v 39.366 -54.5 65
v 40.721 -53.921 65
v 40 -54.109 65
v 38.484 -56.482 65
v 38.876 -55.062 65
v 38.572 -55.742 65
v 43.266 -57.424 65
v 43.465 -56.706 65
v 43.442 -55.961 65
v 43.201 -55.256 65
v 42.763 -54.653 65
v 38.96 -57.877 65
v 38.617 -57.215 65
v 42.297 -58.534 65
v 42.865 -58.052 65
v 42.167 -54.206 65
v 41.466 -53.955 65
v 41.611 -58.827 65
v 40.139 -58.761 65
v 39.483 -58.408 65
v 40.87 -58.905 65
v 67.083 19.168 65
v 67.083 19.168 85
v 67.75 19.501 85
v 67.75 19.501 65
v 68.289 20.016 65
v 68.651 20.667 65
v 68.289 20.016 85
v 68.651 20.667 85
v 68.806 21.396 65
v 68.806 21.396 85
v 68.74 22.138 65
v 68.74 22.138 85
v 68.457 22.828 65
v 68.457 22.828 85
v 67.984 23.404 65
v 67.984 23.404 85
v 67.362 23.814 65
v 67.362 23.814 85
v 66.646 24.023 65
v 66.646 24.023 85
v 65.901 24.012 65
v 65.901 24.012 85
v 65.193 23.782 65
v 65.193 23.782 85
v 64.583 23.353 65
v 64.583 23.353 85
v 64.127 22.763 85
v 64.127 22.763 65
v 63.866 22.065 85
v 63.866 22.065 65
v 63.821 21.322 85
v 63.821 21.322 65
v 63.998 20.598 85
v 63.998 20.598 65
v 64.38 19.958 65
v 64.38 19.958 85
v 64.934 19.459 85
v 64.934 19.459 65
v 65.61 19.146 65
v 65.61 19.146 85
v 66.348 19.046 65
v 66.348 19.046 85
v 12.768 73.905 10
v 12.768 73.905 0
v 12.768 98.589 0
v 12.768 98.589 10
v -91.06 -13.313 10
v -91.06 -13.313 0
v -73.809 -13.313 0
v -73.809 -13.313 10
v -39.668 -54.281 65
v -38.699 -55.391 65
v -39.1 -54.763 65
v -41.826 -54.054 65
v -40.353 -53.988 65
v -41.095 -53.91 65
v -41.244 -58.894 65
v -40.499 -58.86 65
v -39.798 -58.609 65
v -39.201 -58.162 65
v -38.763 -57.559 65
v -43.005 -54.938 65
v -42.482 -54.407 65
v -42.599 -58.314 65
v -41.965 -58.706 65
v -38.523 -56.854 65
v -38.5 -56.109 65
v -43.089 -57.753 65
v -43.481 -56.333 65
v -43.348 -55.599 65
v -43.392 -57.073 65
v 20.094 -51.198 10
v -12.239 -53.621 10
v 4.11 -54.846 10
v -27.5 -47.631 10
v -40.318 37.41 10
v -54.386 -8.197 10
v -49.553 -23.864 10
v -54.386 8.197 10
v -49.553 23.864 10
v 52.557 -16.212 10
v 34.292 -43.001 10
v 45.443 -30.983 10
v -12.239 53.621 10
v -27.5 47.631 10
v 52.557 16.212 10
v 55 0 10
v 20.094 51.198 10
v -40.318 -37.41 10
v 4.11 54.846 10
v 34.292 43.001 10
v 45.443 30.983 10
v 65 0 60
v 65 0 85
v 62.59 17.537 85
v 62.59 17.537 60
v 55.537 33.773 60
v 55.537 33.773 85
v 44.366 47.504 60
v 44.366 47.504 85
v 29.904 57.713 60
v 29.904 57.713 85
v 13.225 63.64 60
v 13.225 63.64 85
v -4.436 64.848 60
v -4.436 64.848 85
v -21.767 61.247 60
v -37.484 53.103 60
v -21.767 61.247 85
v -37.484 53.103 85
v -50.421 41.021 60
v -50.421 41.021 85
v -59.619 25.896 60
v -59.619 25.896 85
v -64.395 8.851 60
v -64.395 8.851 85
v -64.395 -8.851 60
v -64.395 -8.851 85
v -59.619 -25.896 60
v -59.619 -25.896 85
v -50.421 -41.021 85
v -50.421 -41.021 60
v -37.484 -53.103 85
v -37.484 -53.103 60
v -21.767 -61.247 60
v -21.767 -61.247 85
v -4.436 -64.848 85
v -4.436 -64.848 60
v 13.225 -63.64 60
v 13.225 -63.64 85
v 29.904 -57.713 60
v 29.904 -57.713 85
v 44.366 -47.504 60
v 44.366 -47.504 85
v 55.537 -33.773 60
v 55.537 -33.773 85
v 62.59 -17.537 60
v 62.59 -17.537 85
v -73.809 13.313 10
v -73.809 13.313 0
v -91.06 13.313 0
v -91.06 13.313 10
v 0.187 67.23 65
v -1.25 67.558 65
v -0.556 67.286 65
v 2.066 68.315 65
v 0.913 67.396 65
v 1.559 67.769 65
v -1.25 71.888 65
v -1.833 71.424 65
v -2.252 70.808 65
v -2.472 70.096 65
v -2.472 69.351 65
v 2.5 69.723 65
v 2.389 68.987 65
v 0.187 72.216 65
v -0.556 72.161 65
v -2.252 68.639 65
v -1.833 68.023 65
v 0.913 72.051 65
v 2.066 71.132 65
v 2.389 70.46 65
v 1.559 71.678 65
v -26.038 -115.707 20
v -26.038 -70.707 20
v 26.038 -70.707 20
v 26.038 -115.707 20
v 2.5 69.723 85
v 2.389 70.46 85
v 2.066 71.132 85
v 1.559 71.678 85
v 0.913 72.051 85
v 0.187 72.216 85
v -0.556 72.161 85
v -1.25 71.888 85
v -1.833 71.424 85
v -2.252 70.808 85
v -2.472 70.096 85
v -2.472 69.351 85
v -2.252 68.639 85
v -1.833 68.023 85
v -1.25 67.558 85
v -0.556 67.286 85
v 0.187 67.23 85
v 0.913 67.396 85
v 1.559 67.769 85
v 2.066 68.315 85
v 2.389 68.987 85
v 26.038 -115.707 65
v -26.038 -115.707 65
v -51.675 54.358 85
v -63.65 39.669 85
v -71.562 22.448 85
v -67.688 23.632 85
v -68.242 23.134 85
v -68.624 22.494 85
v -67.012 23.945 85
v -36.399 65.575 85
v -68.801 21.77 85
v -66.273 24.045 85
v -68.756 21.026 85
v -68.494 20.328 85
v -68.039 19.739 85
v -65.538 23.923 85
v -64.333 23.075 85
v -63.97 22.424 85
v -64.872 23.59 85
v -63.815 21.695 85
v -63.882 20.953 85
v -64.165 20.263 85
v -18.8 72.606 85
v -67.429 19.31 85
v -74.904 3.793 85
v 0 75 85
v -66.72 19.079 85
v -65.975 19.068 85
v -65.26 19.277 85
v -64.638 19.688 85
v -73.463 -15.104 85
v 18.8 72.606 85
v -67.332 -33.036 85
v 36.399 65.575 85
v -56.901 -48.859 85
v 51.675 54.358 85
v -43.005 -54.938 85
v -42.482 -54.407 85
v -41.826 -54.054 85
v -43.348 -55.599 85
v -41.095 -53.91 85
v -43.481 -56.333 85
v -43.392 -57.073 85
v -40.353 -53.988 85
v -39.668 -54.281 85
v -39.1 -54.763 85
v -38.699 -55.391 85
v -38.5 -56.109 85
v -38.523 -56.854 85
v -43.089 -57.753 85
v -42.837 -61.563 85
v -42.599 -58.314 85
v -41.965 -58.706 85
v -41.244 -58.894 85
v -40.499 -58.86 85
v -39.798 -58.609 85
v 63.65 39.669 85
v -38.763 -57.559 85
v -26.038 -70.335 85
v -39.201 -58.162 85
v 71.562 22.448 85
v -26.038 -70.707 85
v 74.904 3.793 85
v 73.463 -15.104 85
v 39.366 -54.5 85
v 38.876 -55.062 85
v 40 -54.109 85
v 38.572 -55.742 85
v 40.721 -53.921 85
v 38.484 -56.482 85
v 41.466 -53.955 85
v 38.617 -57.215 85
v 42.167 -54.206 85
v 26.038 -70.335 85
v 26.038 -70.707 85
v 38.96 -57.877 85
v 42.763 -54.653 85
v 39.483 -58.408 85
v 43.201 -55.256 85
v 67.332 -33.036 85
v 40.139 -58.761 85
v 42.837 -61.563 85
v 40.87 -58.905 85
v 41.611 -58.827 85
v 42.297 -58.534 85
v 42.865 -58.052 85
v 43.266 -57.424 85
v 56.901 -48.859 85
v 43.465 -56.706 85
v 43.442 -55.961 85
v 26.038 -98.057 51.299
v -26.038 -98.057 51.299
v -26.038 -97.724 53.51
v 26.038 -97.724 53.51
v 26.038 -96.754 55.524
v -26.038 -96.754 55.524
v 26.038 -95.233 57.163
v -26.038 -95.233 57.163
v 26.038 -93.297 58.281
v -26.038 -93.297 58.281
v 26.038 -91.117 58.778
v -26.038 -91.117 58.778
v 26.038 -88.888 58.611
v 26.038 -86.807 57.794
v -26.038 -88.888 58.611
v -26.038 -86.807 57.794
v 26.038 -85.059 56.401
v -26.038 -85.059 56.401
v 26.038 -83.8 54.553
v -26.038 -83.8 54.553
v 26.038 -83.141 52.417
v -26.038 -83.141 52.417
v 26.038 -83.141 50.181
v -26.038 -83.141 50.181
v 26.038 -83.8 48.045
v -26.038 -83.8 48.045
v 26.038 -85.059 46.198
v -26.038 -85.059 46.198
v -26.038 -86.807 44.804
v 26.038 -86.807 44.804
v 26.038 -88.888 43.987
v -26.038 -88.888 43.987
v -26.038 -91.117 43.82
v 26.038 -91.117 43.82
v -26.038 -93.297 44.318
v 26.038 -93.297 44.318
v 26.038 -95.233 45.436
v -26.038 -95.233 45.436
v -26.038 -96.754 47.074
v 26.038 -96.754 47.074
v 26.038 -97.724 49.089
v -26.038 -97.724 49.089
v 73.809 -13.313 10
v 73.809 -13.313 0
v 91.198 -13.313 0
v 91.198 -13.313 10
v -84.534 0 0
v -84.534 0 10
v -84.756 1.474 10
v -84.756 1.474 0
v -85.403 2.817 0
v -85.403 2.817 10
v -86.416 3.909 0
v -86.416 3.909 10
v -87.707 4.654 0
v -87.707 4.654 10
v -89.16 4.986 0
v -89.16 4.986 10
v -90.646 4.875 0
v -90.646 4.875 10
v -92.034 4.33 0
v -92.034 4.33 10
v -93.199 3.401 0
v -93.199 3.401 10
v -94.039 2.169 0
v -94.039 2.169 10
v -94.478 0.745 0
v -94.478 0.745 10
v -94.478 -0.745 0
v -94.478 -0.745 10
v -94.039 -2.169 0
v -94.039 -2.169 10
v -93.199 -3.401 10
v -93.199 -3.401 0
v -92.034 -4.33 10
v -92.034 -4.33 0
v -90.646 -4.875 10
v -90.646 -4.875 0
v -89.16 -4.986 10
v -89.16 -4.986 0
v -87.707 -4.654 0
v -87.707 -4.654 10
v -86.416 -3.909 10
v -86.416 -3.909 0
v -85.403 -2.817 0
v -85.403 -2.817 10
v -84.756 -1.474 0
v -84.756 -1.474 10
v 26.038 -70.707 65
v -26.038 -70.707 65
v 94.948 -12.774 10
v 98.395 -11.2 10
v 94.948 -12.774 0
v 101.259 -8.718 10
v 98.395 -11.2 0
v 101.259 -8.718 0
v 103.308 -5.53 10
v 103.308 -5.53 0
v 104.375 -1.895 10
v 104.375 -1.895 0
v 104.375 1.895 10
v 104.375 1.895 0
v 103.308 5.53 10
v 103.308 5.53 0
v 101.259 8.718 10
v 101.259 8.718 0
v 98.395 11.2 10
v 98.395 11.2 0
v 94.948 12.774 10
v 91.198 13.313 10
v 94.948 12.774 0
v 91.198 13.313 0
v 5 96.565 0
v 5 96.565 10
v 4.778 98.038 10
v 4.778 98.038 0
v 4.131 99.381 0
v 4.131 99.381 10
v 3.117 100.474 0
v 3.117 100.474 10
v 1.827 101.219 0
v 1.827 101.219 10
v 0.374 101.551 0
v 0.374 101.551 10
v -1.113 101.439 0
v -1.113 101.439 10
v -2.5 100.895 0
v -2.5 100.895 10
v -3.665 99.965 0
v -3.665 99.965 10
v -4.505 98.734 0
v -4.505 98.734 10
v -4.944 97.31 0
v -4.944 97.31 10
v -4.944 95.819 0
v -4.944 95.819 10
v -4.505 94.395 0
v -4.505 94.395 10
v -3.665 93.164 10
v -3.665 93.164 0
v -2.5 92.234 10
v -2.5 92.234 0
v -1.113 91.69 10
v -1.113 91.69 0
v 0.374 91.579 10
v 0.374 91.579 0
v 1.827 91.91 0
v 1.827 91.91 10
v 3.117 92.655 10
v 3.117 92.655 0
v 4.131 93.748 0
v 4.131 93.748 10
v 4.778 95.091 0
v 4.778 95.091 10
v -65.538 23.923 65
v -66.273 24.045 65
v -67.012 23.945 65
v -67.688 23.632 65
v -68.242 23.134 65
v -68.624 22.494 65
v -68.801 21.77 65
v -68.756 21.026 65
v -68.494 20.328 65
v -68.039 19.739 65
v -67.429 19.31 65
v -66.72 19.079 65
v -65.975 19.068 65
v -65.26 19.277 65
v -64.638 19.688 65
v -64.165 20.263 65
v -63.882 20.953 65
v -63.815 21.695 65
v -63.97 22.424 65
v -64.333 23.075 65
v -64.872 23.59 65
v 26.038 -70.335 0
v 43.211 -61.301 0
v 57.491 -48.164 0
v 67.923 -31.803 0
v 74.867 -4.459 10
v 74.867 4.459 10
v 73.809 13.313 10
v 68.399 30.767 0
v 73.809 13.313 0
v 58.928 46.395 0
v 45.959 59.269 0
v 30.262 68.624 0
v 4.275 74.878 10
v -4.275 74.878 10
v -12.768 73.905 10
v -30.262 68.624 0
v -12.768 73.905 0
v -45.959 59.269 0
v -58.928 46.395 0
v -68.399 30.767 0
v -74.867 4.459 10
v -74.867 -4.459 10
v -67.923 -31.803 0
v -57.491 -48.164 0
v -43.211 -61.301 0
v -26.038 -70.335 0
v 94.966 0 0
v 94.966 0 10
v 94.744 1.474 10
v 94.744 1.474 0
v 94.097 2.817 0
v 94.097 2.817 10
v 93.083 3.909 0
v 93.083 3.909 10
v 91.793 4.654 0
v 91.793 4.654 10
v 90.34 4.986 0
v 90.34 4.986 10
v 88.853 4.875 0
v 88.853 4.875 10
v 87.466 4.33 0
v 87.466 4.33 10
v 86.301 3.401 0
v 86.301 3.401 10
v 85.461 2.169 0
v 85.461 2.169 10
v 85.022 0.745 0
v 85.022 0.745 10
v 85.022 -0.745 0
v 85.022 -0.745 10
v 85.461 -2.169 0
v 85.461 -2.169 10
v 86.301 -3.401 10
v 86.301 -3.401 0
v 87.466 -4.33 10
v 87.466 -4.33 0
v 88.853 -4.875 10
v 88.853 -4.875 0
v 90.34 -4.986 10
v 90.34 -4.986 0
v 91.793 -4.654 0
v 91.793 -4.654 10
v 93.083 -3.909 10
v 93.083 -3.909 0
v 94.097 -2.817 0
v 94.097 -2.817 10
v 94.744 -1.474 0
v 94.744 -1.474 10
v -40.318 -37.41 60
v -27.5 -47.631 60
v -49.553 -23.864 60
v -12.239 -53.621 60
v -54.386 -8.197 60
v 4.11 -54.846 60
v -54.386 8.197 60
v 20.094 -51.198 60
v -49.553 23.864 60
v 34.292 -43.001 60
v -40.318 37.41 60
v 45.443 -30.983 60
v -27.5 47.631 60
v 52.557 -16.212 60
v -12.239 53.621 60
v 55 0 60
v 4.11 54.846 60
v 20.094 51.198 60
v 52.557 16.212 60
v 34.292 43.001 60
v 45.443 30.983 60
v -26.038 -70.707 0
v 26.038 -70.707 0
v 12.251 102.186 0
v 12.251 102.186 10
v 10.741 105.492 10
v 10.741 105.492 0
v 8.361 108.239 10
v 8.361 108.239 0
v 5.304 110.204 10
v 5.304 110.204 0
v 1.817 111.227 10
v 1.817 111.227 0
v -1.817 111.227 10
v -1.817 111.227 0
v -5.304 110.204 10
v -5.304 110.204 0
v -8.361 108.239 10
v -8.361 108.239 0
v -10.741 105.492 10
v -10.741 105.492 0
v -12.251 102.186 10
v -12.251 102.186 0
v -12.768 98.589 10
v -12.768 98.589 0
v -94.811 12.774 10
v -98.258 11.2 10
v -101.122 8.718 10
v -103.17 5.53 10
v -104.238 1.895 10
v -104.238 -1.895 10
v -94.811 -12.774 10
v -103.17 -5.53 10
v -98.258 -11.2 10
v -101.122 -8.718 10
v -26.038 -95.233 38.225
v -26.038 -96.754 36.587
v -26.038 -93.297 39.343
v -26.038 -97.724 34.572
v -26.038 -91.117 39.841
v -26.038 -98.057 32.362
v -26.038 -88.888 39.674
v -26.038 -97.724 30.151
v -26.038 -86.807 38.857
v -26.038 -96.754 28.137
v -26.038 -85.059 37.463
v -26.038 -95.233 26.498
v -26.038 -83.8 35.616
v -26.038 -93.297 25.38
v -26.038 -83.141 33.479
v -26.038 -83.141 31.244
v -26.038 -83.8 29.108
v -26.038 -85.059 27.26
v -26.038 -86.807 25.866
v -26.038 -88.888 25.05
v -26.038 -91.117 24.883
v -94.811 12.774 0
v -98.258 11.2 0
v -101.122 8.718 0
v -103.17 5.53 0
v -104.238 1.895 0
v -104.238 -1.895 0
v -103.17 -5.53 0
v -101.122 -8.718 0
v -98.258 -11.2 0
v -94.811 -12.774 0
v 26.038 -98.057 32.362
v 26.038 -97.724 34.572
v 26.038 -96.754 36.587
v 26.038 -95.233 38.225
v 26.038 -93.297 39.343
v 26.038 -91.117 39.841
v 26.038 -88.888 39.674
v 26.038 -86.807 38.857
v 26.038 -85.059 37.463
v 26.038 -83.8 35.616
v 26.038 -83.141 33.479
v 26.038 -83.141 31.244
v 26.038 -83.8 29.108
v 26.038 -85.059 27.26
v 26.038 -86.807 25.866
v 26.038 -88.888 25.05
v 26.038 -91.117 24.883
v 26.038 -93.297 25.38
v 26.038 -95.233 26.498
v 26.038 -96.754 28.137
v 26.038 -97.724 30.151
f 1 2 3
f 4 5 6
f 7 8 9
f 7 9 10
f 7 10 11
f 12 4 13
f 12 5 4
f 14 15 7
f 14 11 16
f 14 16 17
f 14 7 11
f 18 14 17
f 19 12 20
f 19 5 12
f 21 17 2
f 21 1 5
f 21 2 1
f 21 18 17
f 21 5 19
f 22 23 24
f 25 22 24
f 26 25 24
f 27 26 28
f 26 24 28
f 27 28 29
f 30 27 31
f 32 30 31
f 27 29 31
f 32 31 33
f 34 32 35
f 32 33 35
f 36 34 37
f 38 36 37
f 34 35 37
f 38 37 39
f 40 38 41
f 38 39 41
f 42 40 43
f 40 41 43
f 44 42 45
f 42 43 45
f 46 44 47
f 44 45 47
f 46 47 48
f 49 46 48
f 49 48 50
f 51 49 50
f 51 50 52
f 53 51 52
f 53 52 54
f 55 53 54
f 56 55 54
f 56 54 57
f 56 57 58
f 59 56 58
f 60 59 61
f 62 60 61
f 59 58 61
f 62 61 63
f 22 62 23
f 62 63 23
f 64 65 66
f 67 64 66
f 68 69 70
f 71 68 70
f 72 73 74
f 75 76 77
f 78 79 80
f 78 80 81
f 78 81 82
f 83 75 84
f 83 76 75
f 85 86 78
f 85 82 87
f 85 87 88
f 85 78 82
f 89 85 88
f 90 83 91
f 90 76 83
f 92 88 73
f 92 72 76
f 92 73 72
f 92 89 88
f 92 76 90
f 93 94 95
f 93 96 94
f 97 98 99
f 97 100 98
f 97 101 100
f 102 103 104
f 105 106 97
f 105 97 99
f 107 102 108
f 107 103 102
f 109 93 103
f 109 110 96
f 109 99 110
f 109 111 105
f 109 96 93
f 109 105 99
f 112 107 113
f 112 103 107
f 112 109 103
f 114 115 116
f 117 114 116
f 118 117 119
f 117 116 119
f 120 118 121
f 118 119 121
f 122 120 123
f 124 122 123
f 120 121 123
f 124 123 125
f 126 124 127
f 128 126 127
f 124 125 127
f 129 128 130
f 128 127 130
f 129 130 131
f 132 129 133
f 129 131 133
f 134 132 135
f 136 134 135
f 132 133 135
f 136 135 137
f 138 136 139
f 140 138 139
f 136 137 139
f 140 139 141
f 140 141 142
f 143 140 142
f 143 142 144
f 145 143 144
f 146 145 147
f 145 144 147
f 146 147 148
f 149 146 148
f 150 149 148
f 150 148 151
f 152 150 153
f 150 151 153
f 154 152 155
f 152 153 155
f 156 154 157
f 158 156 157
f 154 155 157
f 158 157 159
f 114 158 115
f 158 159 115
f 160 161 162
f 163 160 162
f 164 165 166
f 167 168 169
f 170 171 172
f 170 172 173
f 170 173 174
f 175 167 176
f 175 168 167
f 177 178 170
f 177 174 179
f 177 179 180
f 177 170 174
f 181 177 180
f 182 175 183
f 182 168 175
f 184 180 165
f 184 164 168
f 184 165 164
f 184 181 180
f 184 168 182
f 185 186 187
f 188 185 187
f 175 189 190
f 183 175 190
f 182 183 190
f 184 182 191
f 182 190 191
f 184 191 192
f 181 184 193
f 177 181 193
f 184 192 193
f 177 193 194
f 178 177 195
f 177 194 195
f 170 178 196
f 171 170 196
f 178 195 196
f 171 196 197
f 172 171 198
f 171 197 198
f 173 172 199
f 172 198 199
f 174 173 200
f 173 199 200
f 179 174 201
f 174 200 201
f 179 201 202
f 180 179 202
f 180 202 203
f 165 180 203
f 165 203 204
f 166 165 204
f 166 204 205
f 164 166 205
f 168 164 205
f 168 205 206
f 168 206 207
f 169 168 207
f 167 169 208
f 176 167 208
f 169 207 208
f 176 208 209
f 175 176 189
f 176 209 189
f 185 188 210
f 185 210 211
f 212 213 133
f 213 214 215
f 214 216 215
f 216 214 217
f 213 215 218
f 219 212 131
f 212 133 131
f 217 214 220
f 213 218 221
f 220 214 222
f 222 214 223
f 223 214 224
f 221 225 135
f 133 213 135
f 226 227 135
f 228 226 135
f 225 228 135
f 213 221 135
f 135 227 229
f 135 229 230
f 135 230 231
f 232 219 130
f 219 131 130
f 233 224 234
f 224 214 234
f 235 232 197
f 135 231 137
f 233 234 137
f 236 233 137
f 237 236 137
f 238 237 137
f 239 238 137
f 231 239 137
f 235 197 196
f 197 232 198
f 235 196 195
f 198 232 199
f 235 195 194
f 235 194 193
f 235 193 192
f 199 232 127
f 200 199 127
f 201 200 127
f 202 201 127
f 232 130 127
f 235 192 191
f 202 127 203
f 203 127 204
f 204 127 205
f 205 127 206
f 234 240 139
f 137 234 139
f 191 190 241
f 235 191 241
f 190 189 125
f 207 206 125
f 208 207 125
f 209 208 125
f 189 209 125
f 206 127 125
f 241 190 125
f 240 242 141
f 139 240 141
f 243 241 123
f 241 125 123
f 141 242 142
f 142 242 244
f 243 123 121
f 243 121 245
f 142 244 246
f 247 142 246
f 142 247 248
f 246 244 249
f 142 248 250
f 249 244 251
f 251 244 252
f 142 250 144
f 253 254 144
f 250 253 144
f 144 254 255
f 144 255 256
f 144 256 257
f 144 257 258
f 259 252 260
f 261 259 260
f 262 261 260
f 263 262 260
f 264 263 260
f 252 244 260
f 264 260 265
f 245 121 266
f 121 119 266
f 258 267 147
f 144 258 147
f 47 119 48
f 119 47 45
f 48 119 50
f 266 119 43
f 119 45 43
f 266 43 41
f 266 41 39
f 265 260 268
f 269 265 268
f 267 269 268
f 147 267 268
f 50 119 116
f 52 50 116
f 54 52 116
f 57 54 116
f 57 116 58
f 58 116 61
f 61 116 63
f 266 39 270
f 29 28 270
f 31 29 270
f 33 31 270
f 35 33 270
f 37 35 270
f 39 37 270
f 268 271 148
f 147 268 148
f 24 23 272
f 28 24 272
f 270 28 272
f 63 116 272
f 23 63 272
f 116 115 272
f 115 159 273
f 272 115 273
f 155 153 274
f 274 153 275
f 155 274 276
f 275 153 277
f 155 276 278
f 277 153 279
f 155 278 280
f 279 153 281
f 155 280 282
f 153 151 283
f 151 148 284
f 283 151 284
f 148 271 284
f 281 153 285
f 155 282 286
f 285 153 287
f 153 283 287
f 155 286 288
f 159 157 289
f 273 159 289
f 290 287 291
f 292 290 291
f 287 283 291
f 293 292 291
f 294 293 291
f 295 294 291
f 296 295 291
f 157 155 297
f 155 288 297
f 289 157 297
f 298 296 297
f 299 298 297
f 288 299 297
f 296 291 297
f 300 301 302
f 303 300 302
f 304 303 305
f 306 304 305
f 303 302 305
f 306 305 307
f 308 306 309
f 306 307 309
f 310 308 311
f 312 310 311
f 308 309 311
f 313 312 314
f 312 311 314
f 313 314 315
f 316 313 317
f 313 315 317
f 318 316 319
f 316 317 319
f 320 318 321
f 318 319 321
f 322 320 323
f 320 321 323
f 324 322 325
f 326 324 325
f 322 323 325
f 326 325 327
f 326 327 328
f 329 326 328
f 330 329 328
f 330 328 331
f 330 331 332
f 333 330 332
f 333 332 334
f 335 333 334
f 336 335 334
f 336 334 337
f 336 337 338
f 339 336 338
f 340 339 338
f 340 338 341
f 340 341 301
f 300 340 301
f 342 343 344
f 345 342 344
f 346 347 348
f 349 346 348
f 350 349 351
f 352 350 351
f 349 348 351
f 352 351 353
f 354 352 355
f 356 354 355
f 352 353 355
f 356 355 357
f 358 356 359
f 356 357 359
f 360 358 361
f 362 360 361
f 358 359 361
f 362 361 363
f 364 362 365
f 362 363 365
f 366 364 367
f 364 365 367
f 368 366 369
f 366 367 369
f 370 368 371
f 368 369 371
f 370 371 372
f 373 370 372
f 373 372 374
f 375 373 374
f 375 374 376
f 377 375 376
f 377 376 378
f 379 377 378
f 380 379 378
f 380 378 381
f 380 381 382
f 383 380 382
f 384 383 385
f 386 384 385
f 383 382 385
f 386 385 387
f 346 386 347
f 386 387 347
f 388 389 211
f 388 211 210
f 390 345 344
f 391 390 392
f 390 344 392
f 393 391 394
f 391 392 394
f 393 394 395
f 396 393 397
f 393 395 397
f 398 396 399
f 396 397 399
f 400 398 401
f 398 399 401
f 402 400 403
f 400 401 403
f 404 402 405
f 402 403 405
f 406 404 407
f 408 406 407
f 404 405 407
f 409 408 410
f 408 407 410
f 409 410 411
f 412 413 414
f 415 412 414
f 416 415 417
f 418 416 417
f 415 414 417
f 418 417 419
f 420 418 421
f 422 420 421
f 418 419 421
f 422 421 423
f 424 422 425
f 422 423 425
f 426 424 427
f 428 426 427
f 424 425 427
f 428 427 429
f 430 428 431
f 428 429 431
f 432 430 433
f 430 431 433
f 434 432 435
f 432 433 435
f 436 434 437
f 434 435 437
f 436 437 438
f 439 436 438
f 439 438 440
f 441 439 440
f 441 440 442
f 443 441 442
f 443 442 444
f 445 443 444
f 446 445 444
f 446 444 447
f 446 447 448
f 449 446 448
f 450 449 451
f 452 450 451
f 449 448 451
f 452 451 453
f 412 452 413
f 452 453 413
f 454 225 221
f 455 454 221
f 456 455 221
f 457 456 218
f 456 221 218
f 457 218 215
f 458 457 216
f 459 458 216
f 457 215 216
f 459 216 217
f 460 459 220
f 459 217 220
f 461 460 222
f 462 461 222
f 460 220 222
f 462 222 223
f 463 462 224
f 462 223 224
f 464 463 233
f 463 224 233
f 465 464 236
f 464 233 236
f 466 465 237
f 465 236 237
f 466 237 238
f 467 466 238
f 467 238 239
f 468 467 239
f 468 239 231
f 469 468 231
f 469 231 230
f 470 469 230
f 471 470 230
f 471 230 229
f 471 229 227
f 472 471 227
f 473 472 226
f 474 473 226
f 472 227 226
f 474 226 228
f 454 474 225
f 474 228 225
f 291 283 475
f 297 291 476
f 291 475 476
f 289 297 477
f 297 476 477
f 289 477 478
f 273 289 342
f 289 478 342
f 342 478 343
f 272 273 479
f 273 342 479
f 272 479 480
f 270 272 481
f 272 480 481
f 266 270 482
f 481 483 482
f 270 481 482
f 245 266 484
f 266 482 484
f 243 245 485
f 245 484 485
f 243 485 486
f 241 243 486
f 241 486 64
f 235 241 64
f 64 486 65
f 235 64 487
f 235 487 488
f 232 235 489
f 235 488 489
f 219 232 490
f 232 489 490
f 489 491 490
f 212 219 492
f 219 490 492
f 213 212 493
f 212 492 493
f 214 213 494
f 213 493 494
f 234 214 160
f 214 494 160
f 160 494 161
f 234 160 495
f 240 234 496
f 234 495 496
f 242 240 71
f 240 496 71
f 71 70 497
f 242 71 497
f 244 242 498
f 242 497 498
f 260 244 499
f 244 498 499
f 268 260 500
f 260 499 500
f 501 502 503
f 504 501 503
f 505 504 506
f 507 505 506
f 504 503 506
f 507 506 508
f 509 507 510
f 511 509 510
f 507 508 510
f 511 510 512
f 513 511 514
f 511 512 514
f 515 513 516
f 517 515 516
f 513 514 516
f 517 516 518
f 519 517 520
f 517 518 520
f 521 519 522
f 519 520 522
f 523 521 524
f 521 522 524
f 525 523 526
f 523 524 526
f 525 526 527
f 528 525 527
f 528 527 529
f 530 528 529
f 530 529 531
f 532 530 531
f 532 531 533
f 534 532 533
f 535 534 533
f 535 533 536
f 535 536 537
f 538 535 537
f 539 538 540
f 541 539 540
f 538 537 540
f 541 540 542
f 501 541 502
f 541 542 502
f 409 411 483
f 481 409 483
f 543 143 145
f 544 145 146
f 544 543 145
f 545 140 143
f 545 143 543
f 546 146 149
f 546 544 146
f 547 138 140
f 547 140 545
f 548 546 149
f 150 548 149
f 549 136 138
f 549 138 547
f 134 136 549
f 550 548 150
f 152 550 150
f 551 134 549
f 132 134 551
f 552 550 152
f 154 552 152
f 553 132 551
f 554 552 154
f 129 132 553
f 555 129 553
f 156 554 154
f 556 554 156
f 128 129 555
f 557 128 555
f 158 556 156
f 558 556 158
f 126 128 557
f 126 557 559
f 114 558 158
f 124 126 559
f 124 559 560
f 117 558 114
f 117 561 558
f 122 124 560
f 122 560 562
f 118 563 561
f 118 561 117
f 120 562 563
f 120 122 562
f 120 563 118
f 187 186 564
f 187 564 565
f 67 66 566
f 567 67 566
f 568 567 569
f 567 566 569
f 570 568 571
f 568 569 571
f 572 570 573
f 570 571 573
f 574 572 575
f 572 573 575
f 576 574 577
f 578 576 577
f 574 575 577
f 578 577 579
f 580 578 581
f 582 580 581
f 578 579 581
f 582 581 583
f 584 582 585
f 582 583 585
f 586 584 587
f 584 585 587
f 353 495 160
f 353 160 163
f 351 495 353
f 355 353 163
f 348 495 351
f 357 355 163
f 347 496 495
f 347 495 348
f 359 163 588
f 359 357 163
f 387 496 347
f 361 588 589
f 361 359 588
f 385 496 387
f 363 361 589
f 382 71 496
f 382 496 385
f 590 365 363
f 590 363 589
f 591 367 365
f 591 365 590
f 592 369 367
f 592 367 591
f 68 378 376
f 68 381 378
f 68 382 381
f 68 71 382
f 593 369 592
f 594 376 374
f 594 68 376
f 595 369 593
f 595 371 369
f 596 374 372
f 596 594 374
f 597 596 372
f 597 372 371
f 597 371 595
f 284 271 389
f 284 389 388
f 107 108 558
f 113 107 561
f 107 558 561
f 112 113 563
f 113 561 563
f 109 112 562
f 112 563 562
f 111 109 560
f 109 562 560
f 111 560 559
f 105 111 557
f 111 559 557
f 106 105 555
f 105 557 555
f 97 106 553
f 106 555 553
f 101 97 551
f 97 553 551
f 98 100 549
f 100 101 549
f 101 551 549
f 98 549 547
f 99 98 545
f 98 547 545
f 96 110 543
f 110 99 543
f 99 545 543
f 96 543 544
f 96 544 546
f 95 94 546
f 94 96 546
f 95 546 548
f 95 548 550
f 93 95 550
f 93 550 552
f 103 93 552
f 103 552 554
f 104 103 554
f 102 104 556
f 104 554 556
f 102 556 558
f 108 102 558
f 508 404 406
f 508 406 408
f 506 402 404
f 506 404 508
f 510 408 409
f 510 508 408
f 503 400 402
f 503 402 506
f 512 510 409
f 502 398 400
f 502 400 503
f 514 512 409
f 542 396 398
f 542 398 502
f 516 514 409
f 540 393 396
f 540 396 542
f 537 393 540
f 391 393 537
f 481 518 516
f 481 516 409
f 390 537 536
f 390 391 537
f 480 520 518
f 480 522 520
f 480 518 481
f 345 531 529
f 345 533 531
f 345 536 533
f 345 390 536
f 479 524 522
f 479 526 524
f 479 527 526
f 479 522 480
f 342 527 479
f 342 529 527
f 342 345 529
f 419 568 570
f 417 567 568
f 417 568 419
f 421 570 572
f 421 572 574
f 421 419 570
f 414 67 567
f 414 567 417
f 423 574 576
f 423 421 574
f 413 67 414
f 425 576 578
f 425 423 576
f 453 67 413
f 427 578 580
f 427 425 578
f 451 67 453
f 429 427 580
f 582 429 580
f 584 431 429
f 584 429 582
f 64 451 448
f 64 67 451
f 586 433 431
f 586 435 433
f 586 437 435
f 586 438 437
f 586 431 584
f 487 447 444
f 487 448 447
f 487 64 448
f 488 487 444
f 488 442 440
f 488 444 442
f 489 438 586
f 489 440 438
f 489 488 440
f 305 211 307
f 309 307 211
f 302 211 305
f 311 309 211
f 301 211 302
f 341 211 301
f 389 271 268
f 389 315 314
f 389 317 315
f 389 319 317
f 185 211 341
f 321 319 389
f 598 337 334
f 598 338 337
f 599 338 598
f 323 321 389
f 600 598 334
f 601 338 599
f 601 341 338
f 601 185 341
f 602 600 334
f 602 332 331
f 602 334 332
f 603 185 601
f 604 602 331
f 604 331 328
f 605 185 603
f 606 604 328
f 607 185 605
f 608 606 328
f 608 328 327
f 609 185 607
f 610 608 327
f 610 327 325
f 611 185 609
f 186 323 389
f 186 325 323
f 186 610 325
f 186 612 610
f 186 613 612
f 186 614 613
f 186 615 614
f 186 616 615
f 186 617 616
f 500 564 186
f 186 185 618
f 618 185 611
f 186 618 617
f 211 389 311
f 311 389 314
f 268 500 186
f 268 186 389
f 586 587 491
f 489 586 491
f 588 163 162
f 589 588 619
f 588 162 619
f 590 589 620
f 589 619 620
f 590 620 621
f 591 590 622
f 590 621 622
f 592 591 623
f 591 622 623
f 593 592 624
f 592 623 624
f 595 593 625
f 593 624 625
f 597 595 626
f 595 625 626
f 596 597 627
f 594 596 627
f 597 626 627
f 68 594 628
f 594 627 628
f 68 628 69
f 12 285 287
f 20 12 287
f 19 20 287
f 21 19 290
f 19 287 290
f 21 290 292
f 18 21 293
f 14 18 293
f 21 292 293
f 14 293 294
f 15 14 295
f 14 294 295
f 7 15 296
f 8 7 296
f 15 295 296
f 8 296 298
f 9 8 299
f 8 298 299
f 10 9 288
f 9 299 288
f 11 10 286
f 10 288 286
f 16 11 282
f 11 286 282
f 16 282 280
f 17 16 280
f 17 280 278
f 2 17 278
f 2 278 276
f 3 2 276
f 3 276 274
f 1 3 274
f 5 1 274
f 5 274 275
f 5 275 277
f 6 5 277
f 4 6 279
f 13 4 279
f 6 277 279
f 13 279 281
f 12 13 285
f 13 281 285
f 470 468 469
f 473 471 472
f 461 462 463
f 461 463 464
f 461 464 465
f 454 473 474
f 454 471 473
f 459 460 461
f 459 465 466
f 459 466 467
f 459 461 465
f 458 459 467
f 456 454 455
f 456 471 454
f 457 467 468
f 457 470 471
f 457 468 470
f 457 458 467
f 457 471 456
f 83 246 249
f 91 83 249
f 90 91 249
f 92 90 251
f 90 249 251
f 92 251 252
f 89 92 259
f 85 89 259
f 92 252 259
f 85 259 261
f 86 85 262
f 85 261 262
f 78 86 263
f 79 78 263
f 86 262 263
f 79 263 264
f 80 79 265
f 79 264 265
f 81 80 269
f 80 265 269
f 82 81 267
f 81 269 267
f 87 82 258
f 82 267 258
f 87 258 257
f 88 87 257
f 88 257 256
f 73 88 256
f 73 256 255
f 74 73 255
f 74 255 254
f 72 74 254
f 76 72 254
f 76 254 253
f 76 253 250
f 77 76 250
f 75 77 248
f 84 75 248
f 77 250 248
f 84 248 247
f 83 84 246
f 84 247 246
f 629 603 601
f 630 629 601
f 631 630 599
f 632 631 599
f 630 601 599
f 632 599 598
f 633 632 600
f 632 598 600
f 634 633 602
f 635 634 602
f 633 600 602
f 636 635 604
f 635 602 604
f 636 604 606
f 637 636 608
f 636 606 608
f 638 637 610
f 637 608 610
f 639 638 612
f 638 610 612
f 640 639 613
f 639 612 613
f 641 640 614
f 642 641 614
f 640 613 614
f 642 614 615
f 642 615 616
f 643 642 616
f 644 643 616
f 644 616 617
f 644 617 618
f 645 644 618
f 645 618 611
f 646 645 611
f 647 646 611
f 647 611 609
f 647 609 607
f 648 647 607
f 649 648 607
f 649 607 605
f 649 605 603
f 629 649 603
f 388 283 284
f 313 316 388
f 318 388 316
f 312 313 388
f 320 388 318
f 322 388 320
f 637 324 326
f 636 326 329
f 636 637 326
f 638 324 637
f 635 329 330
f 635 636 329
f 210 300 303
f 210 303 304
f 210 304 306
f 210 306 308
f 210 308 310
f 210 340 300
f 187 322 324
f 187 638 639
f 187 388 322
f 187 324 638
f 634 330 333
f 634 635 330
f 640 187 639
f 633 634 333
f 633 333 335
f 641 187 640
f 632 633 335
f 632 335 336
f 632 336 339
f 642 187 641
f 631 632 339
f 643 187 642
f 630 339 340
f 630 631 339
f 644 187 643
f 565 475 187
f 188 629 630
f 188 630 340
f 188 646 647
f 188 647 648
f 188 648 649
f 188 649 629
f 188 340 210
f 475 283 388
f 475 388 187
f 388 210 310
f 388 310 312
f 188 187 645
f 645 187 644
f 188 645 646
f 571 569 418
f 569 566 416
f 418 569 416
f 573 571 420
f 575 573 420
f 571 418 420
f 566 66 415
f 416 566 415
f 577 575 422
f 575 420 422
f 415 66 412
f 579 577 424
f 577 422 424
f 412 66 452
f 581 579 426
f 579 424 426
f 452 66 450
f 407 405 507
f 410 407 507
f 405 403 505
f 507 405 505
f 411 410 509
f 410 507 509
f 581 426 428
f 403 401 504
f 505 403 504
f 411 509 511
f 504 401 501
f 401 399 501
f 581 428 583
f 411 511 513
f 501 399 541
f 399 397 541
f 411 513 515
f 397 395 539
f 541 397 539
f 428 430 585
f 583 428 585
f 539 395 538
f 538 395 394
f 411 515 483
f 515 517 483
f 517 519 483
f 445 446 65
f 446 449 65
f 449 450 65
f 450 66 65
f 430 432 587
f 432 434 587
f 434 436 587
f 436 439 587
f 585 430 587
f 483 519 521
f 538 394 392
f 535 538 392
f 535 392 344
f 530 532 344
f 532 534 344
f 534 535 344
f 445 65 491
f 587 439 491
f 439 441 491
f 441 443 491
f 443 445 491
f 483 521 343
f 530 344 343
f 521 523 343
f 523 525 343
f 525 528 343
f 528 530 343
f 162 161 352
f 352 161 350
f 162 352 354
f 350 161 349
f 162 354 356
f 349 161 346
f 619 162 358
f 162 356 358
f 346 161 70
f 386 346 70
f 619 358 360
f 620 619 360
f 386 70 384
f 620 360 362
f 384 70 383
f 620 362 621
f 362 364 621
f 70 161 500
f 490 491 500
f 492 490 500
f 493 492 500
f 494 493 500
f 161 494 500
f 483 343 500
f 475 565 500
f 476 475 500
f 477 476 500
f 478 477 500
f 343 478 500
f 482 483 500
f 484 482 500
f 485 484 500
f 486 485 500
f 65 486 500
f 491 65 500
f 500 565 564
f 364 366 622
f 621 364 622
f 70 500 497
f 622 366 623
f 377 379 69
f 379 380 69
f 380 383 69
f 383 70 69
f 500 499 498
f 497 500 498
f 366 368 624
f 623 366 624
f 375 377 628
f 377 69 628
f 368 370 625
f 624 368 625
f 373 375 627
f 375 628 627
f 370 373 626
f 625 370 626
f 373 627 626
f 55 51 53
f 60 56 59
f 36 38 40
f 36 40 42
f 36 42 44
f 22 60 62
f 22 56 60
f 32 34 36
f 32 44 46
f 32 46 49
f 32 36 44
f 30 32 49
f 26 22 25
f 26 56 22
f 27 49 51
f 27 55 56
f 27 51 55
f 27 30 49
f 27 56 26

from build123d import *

# Parameters (mm, degrees)
SKETCH2_R               = 75
BOSS_EXTRUDE1_DEPTH     = 85
SKETCH4_R               = 65
CUT_EXTRUDE2_DEPTH      = 25
SKETCH5_R               = 55
CUT_EXTRUDE3_DEPTH      = 50
SKETCH7_R               = 2.5
CUT_EXTRUDE4_DEPTH      = 20
CIRPATTERN1_COUNT       = 5
BOSS_EXTRUDE2_DEPTH     = 85
CUT_EXTRUDE9_DEPTH      = 222.85434026
CUT_EXTRUDE9_DEPTH_BACK = 45
SKETCH29_W              = 52.076433836
SKETCH29_H              = 20
SKETCH23_R              = 7.5
CUT_EXTRUDE8_DEPTH      = 176.561799548
BOSS_EXTRUDE4_DEPTH     = 10
BOSS_EXTRUDE5_DEPTH     = 10
SKETCH32_R              = 5
CUT_EXTRUDE10_DEPTH     = 10


with BuildPart() as part:
    # Sketch2 → Boss-Extrude1 (new body)
    with BuildSketch(Plane(origin=(0, 0, 0), x_dir=(0, 1, 0), z_dir=(0, 0, 1))):
        with Locations(Location((0, 0, 0), (0, 0, 270))):
            Circle(SKETCH2_R)
    extrude(amount=BOSS_EXTRUDE1_DEPTH)

    # Sketch4 → Cut-Extrude2 (cut)
    with BuildSketch(Plane.XY.offset(85)):
        Circle(SKETCH4_R)
    extrude(amount=-CUT_EXTRUDE2_DEPTH, mode=Mode.SUBTRACT)

    # Sketch5 → Cut-Extrude3 (cut)
    with BuildSketch(Plane.XY.offset(60)):
        Circle(SKETCH5_R)
    extrude(amount=-CUT_EXTRUDE3_DEPTH, mode=Mode.SUBTRACT)

    # Sketch7 → Cut-Extrude4 (cut)
    with BuildSketch(Plane.XY.offset(85)):
        with Locations((0, 69.72339814)):
            Circle(SKETCH7_R)
    cut_extrude4 = extrude(amount=-CUT_EXTRUDE4_DEPTH, mode=Mode.SUBTRACT)

    # CirPattern1: Cut-Extrude4 ×5 about axis
    cirpattern1_axis = Axis((0, 0, 0), (0, 0, 1))
    for i in range(1, CIRPATTERN1_COUNT):
        add(cut_extrude4.rotate(cirpattern1_axis, i * 360 / CIRPATTERN1_COUNT), mode=Mode.SUBTRACT)

    # Sketch15 → Boss-Extrude2 (add)
    with BuildSketch(Plane(origin=(0, 0, 0), x_dir=(1, 0, 0), z_dir=(0, 0, -1))):
        Polygon((0, 70.334993138), (26.038216918, 70.334993138), (26.038216918, 115.707494064), (-26.038216918, 115.707494064), (-26.038216918, 70.334993138), align=None)
    extrude(amount=-BOSS_EXTRUDE2_DEPTH)

    # Sketch29 → Cut-Extrude9 (cut, two sides: drawn at the far end of the back side and taken through both)
    with BuildSketch(Plane.XZ.offset(115.707494064).offset(-CUT_EXTRUDE9_DEPTH_BACK)):
        with Locations((0, 75)):
            Rectangle(SKETCH29_W, SKETCH29_H)
        with Locations((0, 10)):
            Rectangle(SKETCH29_W, SKETCH29_H)
    extrude(amount=CUT_EXTRUDE9_DEPTH + CUT_EXTRUDE9_DEPTH_BACK, mode=Mode.SUBTRACT)

    # Sketch23 → Cut-Extrude8 (cut, through all)
    with BuildSketch(Plane(origin=(-26.038216918, 0, 0), x_dir=(0, -1, 0), z_dir=(-1, 0, 0))):
        with Locations((90.556929386, 51.29930896)):
            Circle(SKETCH23_R)
        with Locations((90.556929386, 32.361665764)):
            Circle(SKETCH23_R)
    extrude(amount=-CUT_EXTRUDE8_DEPTH, mode=Mode.SUBTRACT)

    # Sketch30 → Boss-Extrude4 (add)
    with BuildSketch(Plane(origin=(0, 0, 0), x_dir=(1, 0, 0), z_dir=(0, 0, -1))):
        with BuildLine():
            Line((-91.060110116, 13.313174206), (91.197550371, 13.313174206))
            ThreePointArc((91.197550371, 13.313174206), (104.510724577, 0), (91.197550371, -13.313174206))
            Line((91.197550371, -13.313174206), (-91.060110116, -13.313174206))
            ThreePointArc((-91.060110116, -13.313174206), (-104.373284322, 0), (-91.060110116, 13.313174206))
        make_face()
    extrude(amount=-BOSS_EXTRUDE4_DEPTH)

    # Sketch31 → Boss-Extrude5 (add)
    with BuildSketch(Plane(origin=(0, 0, 0), x_dir=(1, 0, 0), z_dir=(0, 0, -1))):
        with BuildLine():
            Line((12.768161156, -41.533975832), (12.768161156, -98.589265102))
            ThreePointArc((12.768161156, -98.589265102), (0, -111.357426258), (-12.768161156, -98.589265102))
            Line((-12.768161156, -98.589265102), (-12.768161156, -41.533975832))
            ThreePointArc((-12.768161156, -41.533975832), (0, -28.765814675), (12.768161156, -41.533975832))
        make_face()
    extrude(amount=-BOSS_EXTRUDE5_DEPTH)

    # Sketch32 → Cut-Extrude10 (cut)
    with BuildSketch(Plane.XY.offset(10)):
        with Locations((-89.533828586, 0)):
            Circle(SKETCH32_R)
        with Locations((0, 96.564616818)):
            Circle(SKETCH32_R)
        with Locations((89.966014067, 0)):
            Circle(SKETCH32_R)
    extrude(amount=-CUT_EXTRUDE10_DEPTH, mode=Mode.SUBTRACT)


solid = part.part
